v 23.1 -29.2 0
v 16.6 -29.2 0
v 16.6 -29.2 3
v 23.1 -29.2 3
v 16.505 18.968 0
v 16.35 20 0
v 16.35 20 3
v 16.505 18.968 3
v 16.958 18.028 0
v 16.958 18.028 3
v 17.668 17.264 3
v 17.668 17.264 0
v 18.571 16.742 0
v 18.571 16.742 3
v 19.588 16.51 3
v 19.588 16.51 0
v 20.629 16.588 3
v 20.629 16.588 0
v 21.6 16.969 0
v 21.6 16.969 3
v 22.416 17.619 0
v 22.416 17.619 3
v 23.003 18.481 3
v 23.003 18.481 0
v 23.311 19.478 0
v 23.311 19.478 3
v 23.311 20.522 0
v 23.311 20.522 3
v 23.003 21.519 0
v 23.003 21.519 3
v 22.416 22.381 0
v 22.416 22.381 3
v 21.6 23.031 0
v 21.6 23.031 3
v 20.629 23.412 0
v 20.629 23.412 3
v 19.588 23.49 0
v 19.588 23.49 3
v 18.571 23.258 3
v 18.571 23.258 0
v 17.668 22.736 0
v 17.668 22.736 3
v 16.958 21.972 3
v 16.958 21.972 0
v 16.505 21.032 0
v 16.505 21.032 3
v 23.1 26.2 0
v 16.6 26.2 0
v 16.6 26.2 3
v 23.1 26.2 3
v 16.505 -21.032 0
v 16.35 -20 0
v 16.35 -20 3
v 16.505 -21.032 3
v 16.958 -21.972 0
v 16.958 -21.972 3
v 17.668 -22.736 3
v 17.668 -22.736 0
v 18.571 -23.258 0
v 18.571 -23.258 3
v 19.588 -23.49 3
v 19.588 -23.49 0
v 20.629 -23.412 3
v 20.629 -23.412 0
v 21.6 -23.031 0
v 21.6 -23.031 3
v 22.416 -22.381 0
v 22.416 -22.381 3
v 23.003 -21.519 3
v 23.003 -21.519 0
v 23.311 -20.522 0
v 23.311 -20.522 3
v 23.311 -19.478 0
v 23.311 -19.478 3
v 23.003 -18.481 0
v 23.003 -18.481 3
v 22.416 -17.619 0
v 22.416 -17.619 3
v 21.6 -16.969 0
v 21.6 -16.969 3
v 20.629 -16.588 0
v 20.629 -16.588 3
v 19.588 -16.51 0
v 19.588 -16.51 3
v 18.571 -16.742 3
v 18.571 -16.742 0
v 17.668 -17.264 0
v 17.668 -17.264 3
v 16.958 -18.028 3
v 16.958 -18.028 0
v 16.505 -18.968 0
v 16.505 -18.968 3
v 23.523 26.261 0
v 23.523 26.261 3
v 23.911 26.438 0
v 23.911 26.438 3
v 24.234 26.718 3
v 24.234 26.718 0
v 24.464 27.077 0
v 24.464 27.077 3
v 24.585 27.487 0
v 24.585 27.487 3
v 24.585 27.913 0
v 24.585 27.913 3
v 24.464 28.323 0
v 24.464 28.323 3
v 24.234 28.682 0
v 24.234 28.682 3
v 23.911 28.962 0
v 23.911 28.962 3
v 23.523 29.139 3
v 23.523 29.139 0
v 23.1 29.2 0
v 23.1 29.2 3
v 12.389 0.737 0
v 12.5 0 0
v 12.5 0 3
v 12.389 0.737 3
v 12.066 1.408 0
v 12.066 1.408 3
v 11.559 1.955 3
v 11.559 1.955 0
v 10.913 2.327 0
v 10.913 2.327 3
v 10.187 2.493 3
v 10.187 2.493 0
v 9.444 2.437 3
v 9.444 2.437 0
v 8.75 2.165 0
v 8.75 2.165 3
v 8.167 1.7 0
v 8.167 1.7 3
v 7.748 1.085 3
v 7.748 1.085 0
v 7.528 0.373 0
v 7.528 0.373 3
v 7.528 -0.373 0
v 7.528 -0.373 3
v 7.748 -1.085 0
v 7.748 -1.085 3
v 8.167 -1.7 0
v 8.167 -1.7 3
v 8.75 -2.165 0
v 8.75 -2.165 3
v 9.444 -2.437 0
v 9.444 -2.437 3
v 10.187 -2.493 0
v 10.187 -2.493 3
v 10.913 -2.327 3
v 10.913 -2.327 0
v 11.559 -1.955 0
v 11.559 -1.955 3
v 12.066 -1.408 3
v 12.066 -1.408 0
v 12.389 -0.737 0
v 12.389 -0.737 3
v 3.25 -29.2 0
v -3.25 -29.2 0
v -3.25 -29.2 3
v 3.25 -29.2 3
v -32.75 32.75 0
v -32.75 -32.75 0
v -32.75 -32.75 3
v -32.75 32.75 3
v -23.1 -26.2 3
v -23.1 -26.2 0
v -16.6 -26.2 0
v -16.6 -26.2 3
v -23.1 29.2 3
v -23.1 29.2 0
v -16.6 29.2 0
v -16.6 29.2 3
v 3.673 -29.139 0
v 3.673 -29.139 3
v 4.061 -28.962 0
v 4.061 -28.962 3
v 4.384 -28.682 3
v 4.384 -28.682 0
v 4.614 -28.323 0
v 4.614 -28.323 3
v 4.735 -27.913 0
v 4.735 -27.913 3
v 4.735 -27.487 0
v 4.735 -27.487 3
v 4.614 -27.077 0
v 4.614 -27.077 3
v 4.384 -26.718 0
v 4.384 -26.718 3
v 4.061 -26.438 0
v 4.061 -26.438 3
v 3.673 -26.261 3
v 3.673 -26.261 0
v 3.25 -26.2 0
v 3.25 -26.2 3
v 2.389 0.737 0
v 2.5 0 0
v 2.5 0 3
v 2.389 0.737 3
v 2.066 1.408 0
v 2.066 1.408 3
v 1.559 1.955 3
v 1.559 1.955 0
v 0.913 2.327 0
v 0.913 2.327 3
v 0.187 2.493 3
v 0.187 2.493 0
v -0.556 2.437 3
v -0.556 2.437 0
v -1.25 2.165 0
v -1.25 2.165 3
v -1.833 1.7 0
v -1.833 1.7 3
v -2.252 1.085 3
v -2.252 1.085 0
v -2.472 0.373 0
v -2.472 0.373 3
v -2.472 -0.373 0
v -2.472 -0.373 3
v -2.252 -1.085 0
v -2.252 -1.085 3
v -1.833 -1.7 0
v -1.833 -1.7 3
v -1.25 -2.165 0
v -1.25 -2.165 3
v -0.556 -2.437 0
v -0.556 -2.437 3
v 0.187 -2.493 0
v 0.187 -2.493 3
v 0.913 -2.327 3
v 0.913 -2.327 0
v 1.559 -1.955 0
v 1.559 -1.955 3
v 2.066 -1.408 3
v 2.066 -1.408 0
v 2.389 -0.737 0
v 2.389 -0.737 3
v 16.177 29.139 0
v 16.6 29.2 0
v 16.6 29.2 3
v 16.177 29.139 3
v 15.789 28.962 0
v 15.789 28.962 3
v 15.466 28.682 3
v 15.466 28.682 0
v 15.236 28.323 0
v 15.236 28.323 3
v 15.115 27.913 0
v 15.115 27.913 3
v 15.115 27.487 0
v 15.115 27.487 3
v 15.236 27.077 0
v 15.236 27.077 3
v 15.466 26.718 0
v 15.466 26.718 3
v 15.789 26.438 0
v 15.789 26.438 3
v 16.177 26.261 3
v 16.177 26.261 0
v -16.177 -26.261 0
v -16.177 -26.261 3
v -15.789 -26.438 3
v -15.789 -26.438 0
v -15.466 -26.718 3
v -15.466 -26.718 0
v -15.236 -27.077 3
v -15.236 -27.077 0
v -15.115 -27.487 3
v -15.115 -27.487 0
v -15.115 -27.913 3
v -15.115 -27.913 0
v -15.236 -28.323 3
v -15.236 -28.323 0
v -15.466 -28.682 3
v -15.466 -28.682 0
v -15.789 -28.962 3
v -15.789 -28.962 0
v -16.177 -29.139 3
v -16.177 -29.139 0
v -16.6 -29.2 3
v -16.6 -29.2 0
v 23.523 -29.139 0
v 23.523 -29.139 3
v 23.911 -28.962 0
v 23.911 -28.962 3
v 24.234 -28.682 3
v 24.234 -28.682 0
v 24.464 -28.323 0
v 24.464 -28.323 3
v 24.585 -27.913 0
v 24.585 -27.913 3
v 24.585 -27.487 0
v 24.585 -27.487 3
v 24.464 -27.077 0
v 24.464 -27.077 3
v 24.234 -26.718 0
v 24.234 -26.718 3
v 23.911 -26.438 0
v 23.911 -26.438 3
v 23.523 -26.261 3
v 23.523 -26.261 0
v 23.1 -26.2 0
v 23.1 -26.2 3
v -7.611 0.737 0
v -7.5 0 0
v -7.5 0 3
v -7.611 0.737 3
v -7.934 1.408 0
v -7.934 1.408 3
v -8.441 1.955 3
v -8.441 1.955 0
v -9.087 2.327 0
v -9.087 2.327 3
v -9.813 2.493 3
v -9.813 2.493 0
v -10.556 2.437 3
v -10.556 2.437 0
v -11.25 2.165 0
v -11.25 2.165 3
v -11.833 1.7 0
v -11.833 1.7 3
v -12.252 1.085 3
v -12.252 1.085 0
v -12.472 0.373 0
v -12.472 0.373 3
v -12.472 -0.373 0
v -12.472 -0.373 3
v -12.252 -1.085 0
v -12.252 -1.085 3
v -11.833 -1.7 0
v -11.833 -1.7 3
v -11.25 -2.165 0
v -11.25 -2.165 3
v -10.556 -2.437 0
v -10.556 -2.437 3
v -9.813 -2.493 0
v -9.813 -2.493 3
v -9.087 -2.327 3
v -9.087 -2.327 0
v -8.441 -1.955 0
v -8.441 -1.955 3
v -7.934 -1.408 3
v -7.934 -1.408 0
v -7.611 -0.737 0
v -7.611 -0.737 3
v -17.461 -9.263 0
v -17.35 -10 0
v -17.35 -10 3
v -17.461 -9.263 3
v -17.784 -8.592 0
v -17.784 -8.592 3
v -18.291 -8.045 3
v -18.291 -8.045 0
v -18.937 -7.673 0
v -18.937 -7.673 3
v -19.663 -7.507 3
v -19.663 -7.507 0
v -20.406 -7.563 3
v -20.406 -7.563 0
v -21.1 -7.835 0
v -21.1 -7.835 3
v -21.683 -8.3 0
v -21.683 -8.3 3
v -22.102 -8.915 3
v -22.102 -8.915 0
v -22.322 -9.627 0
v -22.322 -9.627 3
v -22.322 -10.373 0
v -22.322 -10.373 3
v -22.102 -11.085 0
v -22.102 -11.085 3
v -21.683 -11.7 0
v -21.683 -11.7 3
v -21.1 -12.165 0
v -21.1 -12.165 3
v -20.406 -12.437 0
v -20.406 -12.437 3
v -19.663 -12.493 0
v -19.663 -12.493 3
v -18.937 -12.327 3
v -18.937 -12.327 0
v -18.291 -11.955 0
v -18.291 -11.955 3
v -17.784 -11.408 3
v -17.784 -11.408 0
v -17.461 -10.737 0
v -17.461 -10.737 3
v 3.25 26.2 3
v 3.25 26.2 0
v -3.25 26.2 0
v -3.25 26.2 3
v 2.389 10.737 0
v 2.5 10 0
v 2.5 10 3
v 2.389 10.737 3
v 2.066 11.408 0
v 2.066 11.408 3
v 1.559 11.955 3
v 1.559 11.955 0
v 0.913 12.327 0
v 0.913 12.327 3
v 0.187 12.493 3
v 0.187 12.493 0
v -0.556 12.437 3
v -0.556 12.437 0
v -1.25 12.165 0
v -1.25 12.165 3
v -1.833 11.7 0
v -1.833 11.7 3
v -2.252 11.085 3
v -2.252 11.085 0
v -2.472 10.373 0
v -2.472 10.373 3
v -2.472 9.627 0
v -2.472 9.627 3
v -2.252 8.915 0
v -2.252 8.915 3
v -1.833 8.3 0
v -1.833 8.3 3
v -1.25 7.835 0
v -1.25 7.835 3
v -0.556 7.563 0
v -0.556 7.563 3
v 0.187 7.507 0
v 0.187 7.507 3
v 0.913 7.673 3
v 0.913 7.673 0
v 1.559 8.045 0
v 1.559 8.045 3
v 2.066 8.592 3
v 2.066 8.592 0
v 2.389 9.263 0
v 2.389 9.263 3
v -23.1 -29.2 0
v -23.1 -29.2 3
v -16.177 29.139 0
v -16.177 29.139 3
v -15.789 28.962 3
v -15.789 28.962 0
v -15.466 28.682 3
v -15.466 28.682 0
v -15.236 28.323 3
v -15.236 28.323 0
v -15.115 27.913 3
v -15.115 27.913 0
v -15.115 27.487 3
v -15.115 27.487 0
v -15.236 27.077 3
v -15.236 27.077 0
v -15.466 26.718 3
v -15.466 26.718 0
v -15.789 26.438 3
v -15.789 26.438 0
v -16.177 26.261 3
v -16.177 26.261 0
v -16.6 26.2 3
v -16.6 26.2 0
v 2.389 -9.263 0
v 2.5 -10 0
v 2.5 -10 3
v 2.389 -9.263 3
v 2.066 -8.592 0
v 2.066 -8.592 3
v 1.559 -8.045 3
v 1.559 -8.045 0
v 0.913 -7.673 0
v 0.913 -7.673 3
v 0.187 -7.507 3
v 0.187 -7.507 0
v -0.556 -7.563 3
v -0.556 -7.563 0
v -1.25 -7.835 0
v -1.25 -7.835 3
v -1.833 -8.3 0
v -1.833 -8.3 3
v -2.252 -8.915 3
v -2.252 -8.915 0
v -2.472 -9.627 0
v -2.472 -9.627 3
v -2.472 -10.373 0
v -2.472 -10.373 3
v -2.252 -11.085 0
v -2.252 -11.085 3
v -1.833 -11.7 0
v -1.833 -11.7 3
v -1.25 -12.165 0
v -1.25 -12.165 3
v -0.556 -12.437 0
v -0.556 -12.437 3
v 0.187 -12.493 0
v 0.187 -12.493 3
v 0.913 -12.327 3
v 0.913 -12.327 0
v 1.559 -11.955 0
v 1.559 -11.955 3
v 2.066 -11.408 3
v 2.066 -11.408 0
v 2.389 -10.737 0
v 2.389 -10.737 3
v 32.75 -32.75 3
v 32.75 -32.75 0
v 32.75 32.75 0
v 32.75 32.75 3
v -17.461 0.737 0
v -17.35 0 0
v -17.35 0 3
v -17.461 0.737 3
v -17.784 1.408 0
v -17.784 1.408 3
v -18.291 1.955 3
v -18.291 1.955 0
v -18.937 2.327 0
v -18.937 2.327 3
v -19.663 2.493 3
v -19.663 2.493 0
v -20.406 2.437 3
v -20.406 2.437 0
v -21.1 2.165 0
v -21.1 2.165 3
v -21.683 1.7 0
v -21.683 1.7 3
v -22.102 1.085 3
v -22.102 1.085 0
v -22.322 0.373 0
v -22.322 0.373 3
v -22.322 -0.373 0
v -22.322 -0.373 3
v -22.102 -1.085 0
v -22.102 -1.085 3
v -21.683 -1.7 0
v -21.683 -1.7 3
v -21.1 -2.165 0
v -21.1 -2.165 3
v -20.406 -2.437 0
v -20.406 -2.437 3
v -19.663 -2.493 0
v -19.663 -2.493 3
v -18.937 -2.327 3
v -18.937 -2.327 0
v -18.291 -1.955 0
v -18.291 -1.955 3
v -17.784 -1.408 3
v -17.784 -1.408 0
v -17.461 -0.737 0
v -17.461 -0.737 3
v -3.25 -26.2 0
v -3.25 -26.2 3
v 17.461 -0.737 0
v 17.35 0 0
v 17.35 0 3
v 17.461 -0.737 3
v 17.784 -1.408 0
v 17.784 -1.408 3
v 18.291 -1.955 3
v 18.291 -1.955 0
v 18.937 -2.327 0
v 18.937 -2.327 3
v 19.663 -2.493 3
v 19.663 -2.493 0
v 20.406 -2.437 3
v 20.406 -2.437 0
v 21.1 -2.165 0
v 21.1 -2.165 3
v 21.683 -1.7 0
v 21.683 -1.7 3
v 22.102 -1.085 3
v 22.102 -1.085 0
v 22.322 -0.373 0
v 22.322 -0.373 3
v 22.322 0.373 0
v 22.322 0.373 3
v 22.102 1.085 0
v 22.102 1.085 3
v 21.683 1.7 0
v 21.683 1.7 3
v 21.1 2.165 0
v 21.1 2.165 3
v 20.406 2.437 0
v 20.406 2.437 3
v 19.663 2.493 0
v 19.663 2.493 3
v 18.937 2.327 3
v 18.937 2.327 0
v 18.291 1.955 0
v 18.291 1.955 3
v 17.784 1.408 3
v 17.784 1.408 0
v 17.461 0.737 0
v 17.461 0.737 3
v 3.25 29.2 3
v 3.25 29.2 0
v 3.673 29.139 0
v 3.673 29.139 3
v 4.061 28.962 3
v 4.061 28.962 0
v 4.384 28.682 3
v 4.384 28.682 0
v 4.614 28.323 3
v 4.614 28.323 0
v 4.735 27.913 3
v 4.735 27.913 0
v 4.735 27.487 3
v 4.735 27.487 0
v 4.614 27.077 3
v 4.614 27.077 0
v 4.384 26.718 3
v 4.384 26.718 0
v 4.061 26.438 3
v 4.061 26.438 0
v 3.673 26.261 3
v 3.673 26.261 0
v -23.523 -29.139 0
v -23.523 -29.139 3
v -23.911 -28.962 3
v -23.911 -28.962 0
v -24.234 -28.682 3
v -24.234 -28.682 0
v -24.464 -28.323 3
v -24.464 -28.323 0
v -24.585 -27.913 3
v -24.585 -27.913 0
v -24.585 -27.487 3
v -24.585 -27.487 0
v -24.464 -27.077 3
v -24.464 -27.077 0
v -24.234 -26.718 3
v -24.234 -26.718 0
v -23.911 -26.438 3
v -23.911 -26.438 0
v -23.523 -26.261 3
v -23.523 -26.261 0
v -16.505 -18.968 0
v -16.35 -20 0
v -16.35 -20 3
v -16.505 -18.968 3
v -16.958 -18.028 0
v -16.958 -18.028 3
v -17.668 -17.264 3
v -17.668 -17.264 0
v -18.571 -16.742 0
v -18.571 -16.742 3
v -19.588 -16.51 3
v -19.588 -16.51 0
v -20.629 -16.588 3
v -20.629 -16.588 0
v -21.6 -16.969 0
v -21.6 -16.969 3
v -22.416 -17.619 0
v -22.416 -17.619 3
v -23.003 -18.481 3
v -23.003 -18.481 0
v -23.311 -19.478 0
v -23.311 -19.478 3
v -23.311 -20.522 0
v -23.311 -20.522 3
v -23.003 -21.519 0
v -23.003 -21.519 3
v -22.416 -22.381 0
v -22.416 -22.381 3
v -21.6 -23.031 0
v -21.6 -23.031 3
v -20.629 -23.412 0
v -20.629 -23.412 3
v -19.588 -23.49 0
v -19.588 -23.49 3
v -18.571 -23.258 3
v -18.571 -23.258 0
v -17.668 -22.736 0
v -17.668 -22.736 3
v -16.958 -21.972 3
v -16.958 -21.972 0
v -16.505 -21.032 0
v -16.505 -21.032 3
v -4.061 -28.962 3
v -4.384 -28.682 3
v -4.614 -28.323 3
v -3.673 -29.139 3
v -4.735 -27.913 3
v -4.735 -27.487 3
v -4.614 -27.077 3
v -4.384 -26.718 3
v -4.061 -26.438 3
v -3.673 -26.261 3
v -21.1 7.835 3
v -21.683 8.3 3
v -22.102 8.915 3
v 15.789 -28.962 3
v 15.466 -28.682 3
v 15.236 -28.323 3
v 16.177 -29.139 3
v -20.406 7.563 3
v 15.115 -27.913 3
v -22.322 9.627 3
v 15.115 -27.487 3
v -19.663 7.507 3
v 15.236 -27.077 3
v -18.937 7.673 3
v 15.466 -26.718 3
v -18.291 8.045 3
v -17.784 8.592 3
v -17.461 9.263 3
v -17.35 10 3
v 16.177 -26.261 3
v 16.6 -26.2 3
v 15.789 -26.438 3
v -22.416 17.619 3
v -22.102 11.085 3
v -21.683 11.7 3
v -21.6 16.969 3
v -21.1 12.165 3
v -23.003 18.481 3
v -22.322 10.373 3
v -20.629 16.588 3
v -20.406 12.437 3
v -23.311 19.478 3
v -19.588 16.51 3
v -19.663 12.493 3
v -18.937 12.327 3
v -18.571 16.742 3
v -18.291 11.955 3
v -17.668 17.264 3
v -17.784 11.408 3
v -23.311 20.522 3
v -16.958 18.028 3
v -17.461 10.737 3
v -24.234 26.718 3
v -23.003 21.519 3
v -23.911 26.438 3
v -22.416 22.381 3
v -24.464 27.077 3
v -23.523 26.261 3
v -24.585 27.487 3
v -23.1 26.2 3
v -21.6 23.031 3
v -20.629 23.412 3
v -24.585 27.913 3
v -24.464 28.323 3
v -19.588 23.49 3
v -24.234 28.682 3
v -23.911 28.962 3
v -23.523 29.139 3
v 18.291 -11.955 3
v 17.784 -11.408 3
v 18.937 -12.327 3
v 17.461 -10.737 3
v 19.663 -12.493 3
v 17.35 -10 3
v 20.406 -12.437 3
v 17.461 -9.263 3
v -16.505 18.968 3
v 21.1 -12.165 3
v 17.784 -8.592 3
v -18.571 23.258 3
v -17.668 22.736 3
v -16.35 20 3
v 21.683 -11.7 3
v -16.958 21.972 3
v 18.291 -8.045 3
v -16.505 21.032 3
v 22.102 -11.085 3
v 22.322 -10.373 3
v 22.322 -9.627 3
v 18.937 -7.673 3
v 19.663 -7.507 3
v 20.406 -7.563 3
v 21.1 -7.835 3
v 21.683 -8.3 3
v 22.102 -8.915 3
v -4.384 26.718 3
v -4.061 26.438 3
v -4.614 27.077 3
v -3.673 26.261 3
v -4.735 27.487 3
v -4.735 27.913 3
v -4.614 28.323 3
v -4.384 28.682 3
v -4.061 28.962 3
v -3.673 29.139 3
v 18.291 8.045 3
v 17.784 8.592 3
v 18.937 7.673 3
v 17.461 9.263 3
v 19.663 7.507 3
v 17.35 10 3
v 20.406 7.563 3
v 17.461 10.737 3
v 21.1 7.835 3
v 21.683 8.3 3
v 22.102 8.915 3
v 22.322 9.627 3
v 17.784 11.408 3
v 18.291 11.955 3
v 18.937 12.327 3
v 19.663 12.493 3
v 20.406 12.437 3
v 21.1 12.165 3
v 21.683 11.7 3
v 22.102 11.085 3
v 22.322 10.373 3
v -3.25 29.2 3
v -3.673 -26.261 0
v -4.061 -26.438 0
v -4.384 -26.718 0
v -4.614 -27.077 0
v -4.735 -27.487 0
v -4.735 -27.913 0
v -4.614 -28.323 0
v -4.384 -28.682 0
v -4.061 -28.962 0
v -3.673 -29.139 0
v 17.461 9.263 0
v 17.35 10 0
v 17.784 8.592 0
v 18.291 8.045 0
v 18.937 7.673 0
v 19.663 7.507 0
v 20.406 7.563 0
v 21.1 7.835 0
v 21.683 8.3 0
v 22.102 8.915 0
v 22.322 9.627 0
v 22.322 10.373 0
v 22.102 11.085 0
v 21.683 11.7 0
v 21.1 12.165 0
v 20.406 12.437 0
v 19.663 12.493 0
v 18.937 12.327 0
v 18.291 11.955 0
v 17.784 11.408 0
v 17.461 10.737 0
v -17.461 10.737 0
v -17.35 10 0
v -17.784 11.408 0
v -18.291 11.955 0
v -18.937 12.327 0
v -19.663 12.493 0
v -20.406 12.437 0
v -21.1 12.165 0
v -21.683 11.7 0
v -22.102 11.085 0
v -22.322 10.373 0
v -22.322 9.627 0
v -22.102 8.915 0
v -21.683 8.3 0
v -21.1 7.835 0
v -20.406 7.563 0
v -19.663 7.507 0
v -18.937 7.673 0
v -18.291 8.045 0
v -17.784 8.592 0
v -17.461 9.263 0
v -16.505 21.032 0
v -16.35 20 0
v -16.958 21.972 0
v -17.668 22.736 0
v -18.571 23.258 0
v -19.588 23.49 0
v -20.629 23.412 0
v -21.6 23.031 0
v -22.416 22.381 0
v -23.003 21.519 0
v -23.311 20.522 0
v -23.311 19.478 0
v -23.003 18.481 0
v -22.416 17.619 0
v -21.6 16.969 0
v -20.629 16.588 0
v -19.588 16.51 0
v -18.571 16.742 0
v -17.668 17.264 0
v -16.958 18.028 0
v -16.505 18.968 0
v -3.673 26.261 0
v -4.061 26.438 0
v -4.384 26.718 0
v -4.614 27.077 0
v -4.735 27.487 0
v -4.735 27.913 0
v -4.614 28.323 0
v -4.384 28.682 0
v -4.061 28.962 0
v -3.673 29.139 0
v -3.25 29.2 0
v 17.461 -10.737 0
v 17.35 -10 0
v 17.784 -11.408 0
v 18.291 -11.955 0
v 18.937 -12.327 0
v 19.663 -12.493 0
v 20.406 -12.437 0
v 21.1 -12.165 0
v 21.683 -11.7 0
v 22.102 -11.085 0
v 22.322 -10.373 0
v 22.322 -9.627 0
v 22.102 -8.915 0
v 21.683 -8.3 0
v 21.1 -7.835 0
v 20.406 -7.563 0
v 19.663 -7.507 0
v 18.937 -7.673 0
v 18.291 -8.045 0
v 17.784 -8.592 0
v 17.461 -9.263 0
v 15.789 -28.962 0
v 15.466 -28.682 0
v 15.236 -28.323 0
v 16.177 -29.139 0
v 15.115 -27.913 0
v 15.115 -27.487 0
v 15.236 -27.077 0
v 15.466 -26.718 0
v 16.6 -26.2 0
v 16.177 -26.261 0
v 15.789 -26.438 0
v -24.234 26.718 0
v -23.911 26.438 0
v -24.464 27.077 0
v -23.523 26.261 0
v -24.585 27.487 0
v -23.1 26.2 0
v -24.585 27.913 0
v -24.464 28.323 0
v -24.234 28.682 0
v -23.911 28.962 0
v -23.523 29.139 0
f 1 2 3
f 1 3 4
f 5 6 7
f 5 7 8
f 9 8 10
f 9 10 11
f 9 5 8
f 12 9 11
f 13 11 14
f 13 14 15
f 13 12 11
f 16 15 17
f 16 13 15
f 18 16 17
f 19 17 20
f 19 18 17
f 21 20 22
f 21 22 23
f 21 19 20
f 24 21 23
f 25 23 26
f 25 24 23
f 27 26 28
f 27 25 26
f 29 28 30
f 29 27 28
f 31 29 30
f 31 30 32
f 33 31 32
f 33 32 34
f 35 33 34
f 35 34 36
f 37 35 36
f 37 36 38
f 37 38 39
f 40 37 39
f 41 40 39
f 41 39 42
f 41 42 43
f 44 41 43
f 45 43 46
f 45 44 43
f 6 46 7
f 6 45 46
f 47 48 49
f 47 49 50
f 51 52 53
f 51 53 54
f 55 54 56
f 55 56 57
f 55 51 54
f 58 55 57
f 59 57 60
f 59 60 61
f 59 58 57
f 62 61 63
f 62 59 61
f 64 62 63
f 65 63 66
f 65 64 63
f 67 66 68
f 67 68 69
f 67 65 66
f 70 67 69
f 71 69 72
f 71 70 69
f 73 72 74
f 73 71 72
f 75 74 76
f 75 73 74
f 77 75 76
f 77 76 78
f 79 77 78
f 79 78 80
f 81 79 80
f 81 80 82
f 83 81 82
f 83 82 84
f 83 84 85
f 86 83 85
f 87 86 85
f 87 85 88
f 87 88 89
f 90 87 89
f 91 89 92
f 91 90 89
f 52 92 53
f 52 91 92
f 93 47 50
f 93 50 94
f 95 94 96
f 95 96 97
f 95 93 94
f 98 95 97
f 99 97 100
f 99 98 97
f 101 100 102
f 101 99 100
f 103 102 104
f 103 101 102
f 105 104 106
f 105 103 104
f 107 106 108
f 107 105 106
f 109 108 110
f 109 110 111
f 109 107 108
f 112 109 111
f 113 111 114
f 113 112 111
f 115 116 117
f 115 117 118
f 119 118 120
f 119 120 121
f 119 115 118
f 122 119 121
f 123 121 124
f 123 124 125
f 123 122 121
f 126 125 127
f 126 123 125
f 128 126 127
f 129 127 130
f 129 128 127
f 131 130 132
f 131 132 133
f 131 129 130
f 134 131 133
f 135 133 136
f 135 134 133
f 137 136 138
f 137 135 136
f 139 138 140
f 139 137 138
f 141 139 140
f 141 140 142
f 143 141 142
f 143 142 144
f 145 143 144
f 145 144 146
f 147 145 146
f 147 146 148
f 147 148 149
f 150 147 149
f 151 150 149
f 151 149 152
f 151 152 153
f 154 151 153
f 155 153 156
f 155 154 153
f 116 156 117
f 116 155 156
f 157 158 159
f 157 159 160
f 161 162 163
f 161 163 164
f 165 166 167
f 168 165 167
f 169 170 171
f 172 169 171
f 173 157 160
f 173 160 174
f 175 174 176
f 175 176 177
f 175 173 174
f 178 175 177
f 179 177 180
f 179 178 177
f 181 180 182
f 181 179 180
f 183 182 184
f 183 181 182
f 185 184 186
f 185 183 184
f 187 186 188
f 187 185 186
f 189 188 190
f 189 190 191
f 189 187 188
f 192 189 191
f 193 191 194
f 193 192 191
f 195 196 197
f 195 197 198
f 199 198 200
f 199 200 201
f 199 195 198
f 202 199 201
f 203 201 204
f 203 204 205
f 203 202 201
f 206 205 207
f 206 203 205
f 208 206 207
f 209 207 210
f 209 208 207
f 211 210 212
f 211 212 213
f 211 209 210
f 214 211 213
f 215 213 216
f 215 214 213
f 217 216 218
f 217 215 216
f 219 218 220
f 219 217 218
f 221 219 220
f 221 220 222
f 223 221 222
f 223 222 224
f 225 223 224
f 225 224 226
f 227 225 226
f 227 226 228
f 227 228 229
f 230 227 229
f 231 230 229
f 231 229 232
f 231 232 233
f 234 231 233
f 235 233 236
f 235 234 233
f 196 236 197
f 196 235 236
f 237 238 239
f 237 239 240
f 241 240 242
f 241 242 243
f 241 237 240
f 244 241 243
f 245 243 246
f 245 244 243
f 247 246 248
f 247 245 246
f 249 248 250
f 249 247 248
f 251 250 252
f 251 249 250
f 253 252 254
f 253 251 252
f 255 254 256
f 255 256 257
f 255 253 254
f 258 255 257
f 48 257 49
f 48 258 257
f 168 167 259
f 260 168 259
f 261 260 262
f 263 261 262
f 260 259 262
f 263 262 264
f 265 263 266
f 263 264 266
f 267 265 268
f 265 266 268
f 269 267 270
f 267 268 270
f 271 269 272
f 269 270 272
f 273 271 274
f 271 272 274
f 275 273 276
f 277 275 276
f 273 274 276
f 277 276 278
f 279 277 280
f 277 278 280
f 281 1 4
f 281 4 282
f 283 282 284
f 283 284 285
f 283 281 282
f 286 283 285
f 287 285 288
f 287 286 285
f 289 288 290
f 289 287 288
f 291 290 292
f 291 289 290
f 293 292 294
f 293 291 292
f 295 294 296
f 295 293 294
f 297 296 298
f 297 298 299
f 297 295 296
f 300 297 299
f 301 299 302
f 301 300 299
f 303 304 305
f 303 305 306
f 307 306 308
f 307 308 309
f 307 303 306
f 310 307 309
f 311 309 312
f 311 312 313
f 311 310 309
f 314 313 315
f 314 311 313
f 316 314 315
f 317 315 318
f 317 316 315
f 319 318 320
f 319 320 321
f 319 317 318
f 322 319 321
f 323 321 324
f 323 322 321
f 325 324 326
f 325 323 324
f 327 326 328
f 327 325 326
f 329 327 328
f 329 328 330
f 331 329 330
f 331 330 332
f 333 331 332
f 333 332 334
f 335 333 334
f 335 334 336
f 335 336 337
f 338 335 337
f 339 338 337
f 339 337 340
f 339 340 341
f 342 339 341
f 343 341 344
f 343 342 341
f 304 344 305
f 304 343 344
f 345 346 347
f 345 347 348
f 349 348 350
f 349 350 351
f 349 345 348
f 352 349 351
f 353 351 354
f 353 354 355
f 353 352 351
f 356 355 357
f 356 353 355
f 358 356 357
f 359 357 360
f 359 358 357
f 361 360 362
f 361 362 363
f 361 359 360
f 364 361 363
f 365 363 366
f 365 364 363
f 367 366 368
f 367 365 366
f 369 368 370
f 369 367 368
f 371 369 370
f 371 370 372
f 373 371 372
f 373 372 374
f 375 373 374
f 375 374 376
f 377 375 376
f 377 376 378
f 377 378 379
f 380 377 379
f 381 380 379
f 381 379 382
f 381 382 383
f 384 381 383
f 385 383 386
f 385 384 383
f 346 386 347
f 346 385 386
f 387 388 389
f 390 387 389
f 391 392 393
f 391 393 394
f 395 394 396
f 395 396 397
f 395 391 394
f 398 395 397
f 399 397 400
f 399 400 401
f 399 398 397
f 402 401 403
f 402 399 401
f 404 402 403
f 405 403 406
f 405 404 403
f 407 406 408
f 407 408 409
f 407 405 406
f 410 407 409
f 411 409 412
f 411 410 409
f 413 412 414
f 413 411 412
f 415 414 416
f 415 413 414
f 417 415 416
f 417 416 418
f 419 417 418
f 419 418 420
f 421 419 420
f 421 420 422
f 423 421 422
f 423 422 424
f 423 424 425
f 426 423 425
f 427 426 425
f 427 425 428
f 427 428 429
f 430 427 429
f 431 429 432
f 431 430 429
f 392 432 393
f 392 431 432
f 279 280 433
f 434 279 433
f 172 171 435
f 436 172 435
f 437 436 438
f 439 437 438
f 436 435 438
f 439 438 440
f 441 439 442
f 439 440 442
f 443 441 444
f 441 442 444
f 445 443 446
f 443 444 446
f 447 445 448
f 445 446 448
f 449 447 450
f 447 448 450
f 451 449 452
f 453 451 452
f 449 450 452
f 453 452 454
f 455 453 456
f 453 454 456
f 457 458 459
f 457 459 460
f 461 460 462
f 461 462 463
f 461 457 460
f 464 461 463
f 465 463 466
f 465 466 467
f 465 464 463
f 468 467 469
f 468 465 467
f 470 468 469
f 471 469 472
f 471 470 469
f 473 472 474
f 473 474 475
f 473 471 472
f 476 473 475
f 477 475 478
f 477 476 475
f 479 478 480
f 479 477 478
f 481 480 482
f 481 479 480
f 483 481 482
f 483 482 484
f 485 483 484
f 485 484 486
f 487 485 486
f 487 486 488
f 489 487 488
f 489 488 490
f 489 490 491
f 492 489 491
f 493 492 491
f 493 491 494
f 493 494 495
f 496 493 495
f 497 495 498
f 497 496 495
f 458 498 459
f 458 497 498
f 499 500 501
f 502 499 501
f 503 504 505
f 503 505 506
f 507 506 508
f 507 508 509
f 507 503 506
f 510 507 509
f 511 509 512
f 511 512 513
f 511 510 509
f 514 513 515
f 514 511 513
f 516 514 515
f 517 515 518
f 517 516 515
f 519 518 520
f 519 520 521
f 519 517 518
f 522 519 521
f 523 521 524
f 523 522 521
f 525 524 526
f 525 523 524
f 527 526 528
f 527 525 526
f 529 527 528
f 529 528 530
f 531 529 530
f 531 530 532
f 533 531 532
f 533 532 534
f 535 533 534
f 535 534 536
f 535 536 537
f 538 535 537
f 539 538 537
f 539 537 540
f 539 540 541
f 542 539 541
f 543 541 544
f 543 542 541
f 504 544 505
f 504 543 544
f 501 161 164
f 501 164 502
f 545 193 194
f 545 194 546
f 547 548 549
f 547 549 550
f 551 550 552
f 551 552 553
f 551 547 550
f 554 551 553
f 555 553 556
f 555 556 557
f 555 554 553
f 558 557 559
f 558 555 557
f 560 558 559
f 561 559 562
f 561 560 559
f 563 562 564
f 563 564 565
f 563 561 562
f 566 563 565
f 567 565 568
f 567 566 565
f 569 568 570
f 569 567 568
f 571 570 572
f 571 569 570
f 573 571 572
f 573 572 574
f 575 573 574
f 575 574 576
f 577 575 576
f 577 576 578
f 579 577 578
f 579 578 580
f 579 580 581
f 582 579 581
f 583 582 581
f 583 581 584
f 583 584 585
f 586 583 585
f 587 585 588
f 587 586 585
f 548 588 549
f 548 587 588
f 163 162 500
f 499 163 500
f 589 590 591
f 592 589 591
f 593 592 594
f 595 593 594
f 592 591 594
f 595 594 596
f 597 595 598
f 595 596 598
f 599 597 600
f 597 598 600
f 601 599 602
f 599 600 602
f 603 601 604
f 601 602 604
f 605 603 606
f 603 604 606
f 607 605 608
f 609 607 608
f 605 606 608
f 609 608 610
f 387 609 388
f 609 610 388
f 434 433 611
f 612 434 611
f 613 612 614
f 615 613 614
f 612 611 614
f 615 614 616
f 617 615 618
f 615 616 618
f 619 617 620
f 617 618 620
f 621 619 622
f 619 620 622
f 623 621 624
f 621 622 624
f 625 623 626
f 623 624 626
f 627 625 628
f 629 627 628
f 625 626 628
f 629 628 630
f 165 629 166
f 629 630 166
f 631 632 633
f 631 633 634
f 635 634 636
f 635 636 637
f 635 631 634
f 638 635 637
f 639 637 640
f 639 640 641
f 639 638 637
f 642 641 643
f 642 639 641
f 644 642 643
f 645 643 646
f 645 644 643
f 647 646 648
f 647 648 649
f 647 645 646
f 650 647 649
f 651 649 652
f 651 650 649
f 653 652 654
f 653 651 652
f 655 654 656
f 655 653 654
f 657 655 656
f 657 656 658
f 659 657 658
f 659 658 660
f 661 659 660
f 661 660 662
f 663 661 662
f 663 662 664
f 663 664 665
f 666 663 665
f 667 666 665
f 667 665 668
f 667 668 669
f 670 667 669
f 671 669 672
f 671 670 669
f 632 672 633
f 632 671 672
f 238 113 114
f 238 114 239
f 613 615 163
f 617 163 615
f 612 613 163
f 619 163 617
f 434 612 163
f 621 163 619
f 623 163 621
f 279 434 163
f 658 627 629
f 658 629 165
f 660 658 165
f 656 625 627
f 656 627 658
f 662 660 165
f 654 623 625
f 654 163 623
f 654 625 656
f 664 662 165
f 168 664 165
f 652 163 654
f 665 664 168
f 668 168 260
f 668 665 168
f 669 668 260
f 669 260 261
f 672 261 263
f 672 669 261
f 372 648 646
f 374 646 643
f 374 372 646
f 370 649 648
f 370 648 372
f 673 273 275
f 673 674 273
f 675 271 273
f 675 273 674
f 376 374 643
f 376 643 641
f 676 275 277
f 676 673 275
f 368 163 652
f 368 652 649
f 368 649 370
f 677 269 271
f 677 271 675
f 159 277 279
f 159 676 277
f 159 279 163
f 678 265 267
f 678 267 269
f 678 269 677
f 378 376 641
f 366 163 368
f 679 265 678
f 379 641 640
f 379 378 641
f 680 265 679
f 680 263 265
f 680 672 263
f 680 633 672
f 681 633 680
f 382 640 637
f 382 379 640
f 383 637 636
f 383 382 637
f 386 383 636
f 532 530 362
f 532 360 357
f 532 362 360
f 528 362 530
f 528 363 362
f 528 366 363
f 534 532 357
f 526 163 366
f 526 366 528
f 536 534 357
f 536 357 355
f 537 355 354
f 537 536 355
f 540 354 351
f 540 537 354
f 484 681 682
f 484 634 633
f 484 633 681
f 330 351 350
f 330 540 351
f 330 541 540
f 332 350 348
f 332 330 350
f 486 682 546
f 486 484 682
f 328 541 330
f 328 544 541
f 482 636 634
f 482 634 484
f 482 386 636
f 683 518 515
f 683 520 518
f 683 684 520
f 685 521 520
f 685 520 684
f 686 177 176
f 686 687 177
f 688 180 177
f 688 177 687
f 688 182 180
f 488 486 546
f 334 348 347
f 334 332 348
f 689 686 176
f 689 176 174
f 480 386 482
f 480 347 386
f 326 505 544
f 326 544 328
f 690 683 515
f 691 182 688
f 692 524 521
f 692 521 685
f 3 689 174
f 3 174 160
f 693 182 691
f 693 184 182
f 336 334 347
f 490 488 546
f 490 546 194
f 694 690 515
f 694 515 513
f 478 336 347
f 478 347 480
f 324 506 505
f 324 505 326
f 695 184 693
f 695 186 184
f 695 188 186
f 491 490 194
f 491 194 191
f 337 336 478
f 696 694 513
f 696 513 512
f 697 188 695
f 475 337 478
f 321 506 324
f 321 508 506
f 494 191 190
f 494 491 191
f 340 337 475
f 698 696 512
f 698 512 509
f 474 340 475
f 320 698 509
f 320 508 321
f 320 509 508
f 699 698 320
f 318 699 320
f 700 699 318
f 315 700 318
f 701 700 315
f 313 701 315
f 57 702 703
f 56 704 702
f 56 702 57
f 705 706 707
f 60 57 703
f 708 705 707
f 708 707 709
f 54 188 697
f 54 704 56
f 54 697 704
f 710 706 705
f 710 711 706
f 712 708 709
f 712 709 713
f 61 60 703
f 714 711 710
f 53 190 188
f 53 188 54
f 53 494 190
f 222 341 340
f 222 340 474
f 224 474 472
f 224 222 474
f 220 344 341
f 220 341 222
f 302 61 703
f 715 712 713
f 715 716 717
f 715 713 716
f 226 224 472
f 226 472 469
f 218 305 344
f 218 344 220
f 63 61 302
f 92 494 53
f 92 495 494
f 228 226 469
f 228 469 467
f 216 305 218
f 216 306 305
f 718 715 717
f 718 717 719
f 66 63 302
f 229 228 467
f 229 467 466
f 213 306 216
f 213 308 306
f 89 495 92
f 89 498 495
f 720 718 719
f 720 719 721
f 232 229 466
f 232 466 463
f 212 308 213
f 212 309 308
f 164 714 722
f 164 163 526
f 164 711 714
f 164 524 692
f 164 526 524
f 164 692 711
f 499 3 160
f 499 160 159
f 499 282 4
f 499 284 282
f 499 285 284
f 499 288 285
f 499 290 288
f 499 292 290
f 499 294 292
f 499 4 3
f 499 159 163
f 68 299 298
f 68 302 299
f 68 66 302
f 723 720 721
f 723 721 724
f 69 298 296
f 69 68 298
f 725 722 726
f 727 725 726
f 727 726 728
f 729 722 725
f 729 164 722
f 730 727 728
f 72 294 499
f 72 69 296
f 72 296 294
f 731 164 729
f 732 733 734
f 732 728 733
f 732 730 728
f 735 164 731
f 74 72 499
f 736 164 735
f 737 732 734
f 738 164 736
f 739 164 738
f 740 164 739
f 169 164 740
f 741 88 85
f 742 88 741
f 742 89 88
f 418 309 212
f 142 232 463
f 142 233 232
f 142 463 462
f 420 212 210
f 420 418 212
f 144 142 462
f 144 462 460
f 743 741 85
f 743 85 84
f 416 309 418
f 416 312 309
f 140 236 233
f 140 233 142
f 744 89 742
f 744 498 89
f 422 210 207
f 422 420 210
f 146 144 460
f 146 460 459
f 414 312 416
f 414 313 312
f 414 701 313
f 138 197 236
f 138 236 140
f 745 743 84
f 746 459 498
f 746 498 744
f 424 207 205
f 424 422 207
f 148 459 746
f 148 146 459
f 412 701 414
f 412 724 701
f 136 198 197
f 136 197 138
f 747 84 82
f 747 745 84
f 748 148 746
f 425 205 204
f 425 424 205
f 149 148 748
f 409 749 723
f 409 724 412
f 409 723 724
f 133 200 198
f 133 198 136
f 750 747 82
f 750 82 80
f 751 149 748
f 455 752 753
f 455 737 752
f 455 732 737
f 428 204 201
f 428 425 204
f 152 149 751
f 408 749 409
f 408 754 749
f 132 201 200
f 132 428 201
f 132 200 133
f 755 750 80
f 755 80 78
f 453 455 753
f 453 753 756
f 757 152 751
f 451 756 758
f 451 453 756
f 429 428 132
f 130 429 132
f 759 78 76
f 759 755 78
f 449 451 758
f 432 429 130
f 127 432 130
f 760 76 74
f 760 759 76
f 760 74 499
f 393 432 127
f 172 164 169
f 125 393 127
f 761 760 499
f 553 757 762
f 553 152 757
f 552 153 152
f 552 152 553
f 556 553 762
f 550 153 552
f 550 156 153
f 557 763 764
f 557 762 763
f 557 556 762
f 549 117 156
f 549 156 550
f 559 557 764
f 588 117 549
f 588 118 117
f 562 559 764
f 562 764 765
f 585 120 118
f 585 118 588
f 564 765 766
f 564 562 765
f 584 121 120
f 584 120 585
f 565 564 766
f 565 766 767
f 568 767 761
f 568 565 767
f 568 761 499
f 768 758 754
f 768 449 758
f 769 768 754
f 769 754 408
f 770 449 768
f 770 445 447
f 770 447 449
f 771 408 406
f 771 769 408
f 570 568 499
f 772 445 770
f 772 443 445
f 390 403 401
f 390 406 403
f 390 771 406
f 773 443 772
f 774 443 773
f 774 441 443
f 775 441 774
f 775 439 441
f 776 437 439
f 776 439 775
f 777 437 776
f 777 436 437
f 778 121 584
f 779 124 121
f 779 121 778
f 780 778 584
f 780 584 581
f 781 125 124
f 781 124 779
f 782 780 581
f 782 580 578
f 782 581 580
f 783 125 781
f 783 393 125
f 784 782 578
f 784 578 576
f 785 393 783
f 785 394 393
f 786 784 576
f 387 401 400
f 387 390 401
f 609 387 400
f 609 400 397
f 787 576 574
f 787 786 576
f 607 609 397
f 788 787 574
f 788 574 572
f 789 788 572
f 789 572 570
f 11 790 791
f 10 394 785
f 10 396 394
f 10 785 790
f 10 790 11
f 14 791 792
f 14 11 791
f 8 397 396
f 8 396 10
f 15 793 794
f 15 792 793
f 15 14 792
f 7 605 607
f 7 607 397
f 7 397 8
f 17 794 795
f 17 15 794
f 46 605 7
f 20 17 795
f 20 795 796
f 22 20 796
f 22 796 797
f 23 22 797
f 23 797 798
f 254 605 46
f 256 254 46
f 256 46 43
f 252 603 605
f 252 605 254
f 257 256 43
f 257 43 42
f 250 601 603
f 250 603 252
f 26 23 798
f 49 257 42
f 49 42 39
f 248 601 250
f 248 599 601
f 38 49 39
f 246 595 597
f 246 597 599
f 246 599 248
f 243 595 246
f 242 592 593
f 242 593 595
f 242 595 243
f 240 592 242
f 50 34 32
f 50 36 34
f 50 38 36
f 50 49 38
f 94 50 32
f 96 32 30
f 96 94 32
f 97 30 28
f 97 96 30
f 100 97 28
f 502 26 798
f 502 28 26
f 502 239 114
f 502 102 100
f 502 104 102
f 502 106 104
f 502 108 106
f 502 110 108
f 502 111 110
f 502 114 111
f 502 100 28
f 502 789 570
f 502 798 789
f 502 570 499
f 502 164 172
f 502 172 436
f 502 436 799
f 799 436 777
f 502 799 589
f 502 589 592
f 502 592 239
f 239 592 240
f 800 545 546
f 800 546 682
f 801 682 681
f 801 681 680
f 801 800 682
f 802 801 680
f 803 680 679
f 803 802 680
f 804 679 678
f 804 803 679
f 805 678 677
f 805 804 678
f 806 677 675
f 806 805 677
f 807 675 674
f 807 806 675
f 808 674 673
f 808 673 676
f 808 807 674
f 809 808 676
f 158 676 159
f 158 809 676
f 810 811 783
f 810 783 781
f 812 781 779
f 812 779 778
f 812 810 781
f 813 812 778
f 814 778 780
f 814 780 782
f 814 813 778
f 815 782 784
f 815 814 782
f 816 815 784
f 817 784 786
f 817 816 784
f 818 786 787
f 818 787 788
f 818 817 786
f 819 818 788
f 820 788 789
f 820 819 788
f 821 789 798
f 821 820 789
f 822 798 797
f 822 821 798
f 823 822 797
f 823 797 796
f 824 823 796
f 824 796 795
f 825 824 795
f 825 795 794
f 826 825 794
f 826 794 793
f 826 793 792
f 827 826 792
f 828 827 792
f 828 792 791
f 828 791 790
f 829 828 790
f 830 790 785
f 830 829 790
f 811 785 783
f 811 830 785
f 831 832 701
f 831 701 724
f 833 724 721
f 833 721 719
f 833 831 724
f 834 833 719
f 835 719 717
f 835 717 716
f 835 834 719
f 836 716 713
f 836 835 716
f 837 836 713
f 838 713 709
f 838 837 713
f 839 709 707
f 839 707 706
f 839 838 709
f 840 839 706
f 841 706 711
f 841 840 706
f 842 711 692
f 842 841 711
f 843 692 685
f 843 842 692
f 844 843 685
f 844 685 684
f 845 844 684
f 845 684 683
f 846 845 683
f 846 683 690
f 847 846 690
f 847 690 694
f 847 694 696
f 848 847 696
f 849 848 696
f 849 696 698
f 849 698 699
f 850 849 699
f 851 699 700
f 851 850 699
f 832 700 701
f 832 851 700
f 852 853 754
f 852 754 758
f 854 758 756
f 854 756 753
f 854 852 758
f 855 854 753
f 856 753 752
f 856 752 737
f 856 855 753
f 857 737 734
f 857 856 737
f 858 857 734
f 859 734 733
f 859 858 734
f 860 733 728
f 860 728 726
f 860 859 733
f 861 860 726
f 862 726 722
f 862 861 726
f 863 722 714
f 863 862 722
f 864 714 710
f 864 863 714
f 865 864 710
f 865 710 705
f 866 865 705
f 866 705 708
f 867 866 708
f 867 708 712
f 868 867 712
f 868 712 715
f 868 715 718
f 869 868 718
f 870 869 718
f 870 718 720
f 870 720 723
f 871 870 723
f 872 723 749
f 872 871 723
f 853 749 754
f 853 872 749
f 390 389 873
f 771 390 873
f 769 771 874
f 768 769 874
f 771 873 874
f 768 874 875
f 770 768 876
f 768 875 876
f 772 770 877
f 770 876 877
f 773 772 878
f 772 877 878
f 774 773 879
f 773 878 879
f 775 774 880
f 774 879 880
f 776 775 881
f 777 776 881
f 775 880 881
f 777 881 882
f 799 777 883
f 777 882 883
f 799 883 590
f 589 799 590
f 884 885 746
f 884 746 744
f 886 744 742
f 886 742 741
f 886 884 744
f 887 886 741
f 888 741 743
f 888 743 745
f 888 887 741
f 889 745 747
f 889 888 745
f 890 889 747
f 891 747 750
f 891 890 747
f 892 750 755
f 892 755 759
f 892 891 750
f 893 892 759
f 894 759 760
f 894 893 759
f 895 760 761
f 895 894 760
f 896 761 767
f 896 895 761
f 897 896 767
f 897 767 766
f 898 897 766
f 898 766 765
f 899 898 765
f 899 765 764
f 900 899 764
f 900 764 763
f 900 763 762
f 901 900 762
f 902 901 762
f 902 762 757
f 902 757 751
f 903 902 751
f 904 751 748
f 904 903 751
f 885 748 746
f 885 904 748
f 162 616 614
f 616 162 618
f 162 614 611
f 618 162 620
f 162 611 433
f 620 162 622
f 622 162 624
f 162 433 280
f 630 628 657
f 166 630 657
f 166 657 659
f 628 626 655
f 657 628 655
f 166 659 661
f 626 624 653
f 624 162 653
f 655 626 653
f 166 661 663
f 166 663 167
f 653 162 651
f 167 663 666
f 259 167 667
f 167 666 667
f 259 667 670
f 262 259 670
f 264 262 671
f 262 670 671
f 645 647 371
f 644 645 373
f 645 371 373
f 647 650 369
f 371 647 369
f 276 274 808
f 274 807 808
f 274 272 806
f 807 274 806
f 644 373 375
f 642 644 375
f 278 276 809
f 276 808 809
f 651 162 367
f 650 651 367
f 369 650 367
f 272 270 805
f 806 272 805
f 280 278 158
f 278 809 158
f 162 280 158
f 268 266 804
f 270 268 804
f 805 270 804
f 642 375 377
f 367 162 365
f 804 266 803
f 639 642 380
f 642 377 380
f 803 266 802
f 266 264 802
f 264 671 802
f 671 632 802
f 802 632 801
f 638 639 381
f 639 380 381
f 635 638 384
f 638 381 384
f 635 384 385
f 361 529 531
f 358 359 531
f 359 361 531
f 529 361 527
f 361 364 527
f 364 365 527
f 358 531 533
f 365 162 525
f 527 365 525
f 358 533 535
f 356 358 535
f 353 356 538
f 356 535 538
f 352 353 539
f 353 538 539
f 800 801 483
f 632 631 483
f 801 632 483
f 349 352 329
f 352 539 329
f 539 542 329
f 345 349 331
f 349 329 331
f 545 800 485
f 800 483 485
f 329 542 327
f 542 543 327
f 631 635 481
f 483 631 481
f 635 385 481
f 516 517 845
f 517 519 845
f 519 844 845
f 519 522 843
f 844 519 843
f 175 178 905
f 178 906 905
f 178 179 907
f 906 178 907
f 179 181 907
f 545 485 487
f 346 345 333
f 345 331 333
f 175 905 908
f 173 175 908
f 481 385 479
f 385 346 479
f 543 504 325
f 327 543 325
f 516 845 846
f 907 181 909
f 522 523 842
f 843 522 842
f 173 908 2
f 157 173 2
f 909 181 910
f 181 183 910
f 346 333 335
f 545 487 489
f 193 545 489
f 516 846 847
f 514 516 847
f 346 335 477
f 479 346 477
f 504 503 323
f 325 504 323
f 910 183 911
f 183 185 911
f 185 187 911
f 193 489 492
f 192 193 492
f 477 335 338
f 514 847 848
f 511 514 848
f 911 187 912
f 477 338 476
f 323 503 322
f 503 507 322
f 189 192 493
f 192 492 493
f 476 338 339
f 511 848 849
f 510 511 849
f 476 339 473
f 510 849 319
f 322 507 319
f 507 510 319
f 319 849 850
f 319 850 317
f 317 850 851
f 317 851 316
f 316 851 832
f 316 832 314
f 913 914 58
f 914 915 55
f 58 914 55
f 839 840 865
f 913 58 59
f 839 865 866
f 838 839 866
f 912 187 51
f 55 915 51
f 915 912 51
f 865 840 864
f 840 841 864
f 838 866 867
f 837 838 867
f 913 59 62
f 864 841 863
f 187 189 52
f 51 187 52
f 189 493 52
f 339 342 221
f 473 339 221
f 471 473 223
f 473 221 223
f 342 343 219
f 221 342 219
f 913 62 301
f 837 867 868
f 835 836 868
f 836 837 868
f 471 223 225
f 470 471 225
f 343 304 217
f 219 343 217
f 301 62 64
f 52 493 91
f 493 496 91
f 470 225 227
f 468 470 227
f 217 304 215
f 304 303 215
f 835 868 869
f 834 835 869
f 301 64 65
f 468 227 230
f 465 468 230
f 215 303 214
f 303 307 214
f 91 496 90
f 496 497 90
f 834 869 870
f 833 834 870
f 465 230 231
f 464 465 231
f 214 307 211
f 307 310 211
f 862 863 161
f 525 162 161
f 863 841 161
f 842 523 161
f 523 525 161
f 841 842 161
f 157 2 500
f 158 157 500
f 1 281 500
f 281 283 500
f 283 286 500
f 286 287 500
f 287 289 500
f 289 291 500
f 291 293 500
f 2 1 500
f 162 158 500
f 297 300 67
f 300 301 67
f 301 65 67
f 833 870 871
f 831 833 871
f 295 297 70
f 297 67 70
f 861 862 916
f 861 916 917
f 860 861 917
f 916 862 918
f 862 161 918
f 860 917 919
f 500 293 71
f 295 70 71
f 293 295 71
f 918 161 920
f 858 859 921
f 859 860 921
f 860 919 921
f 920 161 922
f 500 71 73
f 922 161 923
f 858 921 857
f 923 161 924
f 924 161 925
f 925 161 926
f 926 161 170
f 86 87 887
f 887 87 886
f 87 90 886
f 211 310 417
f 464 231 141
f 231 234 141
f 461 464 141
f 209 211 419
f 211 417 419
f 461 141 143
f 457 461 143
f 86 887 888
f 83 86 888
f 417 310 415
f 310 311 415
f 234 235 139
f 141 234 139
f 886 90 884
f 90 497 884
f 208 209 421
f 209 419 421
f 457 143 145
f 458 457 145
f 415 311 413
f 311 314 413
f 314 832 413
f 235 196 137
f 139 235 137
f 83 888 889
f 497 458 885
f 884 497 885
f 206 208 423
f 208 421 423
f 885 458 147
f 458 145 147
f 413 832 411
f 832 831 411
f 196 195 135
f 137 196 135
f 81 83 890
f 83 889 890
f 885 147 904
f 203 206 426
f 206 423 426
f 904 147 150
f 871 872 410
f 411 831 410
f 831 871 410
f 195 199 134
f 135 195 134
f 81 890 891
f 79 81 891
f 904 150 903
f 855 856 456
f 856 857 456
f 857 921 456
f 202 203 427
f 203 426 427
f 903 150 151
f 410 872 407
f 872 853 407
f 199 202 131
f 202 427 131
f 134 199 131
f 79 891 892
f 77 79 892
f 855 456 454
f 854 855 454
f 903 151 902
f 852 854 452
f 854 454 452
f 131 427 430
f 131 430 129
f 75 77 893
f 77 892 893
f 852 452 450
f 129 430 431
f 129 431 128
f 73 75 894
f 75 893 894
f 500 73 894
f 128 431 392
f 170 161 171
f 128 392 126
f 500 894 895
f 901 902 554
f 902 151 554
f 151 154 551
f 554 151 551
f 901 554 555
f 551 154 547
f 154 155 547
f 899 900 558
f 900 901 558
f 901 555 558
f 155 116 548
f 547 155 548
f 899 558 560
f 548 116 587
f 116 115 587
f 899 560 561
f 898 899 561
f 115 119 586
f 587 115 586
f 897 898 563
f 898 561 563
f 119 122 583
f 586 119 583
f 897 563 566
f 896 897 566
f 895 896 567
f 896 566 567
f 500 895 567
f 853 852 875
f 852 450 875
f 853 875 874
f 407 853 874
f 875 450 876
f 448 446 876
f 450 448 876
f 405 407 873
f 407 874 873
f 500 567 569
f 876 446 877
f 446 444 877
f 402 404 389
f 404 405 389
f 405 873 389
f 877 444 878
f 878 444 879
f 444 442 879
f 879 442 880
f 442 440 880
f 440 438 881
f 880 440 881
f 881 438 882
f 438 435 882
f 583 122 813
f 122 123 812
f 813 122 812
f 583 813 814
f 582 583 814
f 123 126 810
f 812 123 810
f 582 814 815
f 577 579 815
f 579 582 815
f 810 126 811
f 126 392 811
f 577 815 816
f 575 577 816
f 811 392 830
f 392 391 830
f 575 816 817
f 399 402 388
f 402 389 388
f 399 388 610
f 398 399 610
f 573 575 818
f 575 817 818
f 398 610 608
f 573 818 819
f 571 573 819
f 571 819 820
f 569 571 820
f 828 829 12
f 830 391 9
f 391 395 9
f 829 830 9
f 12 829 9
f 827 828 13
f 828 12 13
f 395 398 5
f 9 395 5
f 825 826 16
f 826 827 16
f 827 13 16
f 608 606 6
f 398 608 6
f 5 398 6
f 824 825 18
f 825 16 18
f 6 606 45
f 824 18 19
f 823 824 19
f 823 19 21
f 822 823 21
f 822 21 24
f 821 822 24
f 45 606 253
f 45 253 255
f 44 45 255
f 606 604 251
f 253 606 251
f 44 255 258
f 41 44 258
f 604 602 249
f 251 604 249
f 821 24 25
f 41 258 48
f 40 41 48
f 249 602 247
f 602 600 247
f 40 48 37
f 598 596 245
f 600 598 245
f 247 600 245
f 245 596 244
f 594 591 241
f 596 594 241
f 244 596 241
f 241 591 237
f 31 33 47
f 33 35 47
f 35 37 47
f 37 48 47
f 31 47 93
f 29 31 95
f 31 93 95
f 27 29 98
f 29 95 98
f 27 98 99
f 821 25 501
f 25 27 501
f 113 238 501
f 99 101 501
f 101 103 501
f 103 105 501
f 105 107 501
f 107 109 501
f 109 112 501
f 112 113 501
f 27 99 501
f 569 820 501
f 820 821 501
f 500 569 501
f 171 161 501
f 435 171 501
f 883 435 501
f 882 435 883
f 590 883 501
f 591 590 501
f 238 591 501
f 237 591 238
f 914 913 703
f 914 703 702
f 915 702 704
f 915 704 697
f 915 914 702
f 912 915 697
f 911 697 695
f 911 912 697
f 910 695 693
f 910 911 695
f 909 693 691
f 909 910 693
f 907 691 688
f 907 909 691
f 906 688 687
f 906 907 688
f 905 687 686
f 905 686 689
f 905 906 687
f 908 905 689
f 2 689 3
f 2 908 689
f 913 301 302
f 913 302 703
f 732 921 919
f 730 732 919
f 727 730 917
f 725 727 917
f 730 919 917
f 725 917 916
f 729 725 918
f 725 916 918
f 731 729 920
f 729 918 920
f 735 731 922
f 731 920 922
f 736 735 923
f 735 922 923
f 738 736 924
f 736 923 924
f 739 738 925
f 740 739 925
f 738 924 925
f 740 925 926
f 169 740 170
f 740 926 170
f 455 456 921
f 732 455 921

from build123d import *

# Parameters (mm, degrees)
SKETCH1_W           = 65.5
SKETCH1_H           = 65.5
SKETCH1_R           = 3.5
SKETCH1_R_2         = 2.5
BOSS_EXTRUDE1_DEPTH = 3


with BuildPart() as part:
    # Sketch1 → Boss-Extrude1 (new body)
    with BuildSketch(Plane.XY):
        Rectangle(SKETCH1_W, SKETCH1_H)
        with Locations((-19.85, 20)):
            Circle(SKETCH1_R, mode=Mode.SUBTRACT)
        with Locations((-19.85, 10)):
            Circle(SKETCH1_R_2, mode=Mode.SUBTRACT)
        with Locations((-19.85, 0)):
            Circle(SKETCH1_R_2, mode=Mode.SUBTRACT)
        with Locations((-19.85, -10)):
            Circle(SKETCH1_R_2, mode=Mode.SUBTRACT)
        with Locations((-19.85, -20)):
            Circle(SKETCH1_R, mode=Mode.SUBTRACT)
        with Locations(Location((19.85, -20, 0), (0, 0, 180))):
            Circle(SKETCH1_R, mode=Mode.SUBTRACT)
        with Locations(Location((19.85, -10, 0), (0, 0, 180))):
            Circle(SKETCH1_R_2, mode=Mode.SUBTRACT)
        with Locations(Location((19.85, 0, 0), (0, 0, 180))):
            Circle(SKETCH1_R_2, mode=Mode.SUBTRACT)
        with Locations(Location((19.85, 10, 0), (0, 0, 180))):
            Circle(SKETCH1_R_2, mode=Mode.SUBTRACT)
        with Locations(Location((19.85, 20, 0), (0, 0, 180))):
            Circle(SKETCH1_R, mode=Mode.SUBTRACT)
        Circle(SKETCH1_R_2, mode=Mode.SUBTRACT)
        with Locations((10, 0)):
            Circle(SKETCH1_R_2, mode=Mode.SUBTRACT)
        with Locations((-10, 0)):
            Circle(SKETCH1_R_2, mode=Mode.SUBTRACT)
        with Locations((0, 10)):
            Circle(SKETCH1_R_2, mode=Mode.SUBTRACT)
        with Locations((0, -10)):
            Circle(SKETCH1_R_2, mode=Mode.SUBTRACT)
        with BuildLine():
            Line((-23.1, 29.2), (-16.6, 29.2))
            ThreePointArc((-16.6, 29.2), (-15.1, 27.7), (-16.6, 26.2))
            Line((-16.6, 26.2), (-23.1, 26.2))
            ThreePointArc((-23.1, 26.2), (-24.6, 27.7), (-23.1, 29.2))
        make_face(mode=Mode.SUBTRACT)
        with BuildLine():
            Line((-23.1, -26.2), (-16.6, -26.2))
            ThreePointArc((-16.6, -26.2), (-15.1, -27.7), (-16.6, -29.2))
            Line((-16.6, -29.2), (-23.1, -29.2))
            ThreePointArc((-23.1, -29.2), (-24.6, -27.7), (-23.1, -26.2))
        make_face(mode=Mode.SUBTRACT)
        with BuildLine():
            Line((-3.25, 29.2), (3.25, 29.2))
            ThreePointArc((3.25, 29.2), (4.75, 27.7), (3.25, 26.2))
            Line((3.25, 26.2), (-3.25, 26.2))
            ThreePointArc((-3.25, 26.2), (-4.75, 27.7), (-3.25, 29.2))
        make_face(mode=Mode.SUBTRACT)
        with BuildLine():
            Line((-3.25, -29.2), (3.25, -29.2))
            ThreePointArc((3.25, -29.2), (4.75, -27.7), (3.25, -26.2))
            Line((3.25, -26.2), (-3.25, -26.2))
            ThreePointArc((-3.25, -26.2), (-4.75, -27.7), (-3.25, -29.2))
        make_face(mode=Mode.SUBTRACT)
        with BuildLine():
            Line((23.1, -26.2), (16.6, -26.2))
            ThreePointArc((16.6, -26.2), (15.1, -27.7), (16.6, -29.2))
            Line((16.6, -29.2), (23.1, -29.2))
            ThreePointArc((23.1, -29.2), (24.6, -27.7), (23.1, -26.2))
        make_face(mode=Mode.SUBTRACT)
        with BuildLine():
            Line((23.1, 29.2), (16.6, 29.2))
            ThreePointArc((16.6, 29.2), (15.1, 27.7), (16.6, 26.2))
            Line((16.6, 26.2), (23.1, 26.2))
            ThreePointArc((23.1, 26.2), (24.6, 27.7), (23.1, 29.2))
        make_face(mode=Mode.SUBTRACT)
    extrude(amount=BOSS_EXTRUDE1_DEPTH)


solid = part.part
